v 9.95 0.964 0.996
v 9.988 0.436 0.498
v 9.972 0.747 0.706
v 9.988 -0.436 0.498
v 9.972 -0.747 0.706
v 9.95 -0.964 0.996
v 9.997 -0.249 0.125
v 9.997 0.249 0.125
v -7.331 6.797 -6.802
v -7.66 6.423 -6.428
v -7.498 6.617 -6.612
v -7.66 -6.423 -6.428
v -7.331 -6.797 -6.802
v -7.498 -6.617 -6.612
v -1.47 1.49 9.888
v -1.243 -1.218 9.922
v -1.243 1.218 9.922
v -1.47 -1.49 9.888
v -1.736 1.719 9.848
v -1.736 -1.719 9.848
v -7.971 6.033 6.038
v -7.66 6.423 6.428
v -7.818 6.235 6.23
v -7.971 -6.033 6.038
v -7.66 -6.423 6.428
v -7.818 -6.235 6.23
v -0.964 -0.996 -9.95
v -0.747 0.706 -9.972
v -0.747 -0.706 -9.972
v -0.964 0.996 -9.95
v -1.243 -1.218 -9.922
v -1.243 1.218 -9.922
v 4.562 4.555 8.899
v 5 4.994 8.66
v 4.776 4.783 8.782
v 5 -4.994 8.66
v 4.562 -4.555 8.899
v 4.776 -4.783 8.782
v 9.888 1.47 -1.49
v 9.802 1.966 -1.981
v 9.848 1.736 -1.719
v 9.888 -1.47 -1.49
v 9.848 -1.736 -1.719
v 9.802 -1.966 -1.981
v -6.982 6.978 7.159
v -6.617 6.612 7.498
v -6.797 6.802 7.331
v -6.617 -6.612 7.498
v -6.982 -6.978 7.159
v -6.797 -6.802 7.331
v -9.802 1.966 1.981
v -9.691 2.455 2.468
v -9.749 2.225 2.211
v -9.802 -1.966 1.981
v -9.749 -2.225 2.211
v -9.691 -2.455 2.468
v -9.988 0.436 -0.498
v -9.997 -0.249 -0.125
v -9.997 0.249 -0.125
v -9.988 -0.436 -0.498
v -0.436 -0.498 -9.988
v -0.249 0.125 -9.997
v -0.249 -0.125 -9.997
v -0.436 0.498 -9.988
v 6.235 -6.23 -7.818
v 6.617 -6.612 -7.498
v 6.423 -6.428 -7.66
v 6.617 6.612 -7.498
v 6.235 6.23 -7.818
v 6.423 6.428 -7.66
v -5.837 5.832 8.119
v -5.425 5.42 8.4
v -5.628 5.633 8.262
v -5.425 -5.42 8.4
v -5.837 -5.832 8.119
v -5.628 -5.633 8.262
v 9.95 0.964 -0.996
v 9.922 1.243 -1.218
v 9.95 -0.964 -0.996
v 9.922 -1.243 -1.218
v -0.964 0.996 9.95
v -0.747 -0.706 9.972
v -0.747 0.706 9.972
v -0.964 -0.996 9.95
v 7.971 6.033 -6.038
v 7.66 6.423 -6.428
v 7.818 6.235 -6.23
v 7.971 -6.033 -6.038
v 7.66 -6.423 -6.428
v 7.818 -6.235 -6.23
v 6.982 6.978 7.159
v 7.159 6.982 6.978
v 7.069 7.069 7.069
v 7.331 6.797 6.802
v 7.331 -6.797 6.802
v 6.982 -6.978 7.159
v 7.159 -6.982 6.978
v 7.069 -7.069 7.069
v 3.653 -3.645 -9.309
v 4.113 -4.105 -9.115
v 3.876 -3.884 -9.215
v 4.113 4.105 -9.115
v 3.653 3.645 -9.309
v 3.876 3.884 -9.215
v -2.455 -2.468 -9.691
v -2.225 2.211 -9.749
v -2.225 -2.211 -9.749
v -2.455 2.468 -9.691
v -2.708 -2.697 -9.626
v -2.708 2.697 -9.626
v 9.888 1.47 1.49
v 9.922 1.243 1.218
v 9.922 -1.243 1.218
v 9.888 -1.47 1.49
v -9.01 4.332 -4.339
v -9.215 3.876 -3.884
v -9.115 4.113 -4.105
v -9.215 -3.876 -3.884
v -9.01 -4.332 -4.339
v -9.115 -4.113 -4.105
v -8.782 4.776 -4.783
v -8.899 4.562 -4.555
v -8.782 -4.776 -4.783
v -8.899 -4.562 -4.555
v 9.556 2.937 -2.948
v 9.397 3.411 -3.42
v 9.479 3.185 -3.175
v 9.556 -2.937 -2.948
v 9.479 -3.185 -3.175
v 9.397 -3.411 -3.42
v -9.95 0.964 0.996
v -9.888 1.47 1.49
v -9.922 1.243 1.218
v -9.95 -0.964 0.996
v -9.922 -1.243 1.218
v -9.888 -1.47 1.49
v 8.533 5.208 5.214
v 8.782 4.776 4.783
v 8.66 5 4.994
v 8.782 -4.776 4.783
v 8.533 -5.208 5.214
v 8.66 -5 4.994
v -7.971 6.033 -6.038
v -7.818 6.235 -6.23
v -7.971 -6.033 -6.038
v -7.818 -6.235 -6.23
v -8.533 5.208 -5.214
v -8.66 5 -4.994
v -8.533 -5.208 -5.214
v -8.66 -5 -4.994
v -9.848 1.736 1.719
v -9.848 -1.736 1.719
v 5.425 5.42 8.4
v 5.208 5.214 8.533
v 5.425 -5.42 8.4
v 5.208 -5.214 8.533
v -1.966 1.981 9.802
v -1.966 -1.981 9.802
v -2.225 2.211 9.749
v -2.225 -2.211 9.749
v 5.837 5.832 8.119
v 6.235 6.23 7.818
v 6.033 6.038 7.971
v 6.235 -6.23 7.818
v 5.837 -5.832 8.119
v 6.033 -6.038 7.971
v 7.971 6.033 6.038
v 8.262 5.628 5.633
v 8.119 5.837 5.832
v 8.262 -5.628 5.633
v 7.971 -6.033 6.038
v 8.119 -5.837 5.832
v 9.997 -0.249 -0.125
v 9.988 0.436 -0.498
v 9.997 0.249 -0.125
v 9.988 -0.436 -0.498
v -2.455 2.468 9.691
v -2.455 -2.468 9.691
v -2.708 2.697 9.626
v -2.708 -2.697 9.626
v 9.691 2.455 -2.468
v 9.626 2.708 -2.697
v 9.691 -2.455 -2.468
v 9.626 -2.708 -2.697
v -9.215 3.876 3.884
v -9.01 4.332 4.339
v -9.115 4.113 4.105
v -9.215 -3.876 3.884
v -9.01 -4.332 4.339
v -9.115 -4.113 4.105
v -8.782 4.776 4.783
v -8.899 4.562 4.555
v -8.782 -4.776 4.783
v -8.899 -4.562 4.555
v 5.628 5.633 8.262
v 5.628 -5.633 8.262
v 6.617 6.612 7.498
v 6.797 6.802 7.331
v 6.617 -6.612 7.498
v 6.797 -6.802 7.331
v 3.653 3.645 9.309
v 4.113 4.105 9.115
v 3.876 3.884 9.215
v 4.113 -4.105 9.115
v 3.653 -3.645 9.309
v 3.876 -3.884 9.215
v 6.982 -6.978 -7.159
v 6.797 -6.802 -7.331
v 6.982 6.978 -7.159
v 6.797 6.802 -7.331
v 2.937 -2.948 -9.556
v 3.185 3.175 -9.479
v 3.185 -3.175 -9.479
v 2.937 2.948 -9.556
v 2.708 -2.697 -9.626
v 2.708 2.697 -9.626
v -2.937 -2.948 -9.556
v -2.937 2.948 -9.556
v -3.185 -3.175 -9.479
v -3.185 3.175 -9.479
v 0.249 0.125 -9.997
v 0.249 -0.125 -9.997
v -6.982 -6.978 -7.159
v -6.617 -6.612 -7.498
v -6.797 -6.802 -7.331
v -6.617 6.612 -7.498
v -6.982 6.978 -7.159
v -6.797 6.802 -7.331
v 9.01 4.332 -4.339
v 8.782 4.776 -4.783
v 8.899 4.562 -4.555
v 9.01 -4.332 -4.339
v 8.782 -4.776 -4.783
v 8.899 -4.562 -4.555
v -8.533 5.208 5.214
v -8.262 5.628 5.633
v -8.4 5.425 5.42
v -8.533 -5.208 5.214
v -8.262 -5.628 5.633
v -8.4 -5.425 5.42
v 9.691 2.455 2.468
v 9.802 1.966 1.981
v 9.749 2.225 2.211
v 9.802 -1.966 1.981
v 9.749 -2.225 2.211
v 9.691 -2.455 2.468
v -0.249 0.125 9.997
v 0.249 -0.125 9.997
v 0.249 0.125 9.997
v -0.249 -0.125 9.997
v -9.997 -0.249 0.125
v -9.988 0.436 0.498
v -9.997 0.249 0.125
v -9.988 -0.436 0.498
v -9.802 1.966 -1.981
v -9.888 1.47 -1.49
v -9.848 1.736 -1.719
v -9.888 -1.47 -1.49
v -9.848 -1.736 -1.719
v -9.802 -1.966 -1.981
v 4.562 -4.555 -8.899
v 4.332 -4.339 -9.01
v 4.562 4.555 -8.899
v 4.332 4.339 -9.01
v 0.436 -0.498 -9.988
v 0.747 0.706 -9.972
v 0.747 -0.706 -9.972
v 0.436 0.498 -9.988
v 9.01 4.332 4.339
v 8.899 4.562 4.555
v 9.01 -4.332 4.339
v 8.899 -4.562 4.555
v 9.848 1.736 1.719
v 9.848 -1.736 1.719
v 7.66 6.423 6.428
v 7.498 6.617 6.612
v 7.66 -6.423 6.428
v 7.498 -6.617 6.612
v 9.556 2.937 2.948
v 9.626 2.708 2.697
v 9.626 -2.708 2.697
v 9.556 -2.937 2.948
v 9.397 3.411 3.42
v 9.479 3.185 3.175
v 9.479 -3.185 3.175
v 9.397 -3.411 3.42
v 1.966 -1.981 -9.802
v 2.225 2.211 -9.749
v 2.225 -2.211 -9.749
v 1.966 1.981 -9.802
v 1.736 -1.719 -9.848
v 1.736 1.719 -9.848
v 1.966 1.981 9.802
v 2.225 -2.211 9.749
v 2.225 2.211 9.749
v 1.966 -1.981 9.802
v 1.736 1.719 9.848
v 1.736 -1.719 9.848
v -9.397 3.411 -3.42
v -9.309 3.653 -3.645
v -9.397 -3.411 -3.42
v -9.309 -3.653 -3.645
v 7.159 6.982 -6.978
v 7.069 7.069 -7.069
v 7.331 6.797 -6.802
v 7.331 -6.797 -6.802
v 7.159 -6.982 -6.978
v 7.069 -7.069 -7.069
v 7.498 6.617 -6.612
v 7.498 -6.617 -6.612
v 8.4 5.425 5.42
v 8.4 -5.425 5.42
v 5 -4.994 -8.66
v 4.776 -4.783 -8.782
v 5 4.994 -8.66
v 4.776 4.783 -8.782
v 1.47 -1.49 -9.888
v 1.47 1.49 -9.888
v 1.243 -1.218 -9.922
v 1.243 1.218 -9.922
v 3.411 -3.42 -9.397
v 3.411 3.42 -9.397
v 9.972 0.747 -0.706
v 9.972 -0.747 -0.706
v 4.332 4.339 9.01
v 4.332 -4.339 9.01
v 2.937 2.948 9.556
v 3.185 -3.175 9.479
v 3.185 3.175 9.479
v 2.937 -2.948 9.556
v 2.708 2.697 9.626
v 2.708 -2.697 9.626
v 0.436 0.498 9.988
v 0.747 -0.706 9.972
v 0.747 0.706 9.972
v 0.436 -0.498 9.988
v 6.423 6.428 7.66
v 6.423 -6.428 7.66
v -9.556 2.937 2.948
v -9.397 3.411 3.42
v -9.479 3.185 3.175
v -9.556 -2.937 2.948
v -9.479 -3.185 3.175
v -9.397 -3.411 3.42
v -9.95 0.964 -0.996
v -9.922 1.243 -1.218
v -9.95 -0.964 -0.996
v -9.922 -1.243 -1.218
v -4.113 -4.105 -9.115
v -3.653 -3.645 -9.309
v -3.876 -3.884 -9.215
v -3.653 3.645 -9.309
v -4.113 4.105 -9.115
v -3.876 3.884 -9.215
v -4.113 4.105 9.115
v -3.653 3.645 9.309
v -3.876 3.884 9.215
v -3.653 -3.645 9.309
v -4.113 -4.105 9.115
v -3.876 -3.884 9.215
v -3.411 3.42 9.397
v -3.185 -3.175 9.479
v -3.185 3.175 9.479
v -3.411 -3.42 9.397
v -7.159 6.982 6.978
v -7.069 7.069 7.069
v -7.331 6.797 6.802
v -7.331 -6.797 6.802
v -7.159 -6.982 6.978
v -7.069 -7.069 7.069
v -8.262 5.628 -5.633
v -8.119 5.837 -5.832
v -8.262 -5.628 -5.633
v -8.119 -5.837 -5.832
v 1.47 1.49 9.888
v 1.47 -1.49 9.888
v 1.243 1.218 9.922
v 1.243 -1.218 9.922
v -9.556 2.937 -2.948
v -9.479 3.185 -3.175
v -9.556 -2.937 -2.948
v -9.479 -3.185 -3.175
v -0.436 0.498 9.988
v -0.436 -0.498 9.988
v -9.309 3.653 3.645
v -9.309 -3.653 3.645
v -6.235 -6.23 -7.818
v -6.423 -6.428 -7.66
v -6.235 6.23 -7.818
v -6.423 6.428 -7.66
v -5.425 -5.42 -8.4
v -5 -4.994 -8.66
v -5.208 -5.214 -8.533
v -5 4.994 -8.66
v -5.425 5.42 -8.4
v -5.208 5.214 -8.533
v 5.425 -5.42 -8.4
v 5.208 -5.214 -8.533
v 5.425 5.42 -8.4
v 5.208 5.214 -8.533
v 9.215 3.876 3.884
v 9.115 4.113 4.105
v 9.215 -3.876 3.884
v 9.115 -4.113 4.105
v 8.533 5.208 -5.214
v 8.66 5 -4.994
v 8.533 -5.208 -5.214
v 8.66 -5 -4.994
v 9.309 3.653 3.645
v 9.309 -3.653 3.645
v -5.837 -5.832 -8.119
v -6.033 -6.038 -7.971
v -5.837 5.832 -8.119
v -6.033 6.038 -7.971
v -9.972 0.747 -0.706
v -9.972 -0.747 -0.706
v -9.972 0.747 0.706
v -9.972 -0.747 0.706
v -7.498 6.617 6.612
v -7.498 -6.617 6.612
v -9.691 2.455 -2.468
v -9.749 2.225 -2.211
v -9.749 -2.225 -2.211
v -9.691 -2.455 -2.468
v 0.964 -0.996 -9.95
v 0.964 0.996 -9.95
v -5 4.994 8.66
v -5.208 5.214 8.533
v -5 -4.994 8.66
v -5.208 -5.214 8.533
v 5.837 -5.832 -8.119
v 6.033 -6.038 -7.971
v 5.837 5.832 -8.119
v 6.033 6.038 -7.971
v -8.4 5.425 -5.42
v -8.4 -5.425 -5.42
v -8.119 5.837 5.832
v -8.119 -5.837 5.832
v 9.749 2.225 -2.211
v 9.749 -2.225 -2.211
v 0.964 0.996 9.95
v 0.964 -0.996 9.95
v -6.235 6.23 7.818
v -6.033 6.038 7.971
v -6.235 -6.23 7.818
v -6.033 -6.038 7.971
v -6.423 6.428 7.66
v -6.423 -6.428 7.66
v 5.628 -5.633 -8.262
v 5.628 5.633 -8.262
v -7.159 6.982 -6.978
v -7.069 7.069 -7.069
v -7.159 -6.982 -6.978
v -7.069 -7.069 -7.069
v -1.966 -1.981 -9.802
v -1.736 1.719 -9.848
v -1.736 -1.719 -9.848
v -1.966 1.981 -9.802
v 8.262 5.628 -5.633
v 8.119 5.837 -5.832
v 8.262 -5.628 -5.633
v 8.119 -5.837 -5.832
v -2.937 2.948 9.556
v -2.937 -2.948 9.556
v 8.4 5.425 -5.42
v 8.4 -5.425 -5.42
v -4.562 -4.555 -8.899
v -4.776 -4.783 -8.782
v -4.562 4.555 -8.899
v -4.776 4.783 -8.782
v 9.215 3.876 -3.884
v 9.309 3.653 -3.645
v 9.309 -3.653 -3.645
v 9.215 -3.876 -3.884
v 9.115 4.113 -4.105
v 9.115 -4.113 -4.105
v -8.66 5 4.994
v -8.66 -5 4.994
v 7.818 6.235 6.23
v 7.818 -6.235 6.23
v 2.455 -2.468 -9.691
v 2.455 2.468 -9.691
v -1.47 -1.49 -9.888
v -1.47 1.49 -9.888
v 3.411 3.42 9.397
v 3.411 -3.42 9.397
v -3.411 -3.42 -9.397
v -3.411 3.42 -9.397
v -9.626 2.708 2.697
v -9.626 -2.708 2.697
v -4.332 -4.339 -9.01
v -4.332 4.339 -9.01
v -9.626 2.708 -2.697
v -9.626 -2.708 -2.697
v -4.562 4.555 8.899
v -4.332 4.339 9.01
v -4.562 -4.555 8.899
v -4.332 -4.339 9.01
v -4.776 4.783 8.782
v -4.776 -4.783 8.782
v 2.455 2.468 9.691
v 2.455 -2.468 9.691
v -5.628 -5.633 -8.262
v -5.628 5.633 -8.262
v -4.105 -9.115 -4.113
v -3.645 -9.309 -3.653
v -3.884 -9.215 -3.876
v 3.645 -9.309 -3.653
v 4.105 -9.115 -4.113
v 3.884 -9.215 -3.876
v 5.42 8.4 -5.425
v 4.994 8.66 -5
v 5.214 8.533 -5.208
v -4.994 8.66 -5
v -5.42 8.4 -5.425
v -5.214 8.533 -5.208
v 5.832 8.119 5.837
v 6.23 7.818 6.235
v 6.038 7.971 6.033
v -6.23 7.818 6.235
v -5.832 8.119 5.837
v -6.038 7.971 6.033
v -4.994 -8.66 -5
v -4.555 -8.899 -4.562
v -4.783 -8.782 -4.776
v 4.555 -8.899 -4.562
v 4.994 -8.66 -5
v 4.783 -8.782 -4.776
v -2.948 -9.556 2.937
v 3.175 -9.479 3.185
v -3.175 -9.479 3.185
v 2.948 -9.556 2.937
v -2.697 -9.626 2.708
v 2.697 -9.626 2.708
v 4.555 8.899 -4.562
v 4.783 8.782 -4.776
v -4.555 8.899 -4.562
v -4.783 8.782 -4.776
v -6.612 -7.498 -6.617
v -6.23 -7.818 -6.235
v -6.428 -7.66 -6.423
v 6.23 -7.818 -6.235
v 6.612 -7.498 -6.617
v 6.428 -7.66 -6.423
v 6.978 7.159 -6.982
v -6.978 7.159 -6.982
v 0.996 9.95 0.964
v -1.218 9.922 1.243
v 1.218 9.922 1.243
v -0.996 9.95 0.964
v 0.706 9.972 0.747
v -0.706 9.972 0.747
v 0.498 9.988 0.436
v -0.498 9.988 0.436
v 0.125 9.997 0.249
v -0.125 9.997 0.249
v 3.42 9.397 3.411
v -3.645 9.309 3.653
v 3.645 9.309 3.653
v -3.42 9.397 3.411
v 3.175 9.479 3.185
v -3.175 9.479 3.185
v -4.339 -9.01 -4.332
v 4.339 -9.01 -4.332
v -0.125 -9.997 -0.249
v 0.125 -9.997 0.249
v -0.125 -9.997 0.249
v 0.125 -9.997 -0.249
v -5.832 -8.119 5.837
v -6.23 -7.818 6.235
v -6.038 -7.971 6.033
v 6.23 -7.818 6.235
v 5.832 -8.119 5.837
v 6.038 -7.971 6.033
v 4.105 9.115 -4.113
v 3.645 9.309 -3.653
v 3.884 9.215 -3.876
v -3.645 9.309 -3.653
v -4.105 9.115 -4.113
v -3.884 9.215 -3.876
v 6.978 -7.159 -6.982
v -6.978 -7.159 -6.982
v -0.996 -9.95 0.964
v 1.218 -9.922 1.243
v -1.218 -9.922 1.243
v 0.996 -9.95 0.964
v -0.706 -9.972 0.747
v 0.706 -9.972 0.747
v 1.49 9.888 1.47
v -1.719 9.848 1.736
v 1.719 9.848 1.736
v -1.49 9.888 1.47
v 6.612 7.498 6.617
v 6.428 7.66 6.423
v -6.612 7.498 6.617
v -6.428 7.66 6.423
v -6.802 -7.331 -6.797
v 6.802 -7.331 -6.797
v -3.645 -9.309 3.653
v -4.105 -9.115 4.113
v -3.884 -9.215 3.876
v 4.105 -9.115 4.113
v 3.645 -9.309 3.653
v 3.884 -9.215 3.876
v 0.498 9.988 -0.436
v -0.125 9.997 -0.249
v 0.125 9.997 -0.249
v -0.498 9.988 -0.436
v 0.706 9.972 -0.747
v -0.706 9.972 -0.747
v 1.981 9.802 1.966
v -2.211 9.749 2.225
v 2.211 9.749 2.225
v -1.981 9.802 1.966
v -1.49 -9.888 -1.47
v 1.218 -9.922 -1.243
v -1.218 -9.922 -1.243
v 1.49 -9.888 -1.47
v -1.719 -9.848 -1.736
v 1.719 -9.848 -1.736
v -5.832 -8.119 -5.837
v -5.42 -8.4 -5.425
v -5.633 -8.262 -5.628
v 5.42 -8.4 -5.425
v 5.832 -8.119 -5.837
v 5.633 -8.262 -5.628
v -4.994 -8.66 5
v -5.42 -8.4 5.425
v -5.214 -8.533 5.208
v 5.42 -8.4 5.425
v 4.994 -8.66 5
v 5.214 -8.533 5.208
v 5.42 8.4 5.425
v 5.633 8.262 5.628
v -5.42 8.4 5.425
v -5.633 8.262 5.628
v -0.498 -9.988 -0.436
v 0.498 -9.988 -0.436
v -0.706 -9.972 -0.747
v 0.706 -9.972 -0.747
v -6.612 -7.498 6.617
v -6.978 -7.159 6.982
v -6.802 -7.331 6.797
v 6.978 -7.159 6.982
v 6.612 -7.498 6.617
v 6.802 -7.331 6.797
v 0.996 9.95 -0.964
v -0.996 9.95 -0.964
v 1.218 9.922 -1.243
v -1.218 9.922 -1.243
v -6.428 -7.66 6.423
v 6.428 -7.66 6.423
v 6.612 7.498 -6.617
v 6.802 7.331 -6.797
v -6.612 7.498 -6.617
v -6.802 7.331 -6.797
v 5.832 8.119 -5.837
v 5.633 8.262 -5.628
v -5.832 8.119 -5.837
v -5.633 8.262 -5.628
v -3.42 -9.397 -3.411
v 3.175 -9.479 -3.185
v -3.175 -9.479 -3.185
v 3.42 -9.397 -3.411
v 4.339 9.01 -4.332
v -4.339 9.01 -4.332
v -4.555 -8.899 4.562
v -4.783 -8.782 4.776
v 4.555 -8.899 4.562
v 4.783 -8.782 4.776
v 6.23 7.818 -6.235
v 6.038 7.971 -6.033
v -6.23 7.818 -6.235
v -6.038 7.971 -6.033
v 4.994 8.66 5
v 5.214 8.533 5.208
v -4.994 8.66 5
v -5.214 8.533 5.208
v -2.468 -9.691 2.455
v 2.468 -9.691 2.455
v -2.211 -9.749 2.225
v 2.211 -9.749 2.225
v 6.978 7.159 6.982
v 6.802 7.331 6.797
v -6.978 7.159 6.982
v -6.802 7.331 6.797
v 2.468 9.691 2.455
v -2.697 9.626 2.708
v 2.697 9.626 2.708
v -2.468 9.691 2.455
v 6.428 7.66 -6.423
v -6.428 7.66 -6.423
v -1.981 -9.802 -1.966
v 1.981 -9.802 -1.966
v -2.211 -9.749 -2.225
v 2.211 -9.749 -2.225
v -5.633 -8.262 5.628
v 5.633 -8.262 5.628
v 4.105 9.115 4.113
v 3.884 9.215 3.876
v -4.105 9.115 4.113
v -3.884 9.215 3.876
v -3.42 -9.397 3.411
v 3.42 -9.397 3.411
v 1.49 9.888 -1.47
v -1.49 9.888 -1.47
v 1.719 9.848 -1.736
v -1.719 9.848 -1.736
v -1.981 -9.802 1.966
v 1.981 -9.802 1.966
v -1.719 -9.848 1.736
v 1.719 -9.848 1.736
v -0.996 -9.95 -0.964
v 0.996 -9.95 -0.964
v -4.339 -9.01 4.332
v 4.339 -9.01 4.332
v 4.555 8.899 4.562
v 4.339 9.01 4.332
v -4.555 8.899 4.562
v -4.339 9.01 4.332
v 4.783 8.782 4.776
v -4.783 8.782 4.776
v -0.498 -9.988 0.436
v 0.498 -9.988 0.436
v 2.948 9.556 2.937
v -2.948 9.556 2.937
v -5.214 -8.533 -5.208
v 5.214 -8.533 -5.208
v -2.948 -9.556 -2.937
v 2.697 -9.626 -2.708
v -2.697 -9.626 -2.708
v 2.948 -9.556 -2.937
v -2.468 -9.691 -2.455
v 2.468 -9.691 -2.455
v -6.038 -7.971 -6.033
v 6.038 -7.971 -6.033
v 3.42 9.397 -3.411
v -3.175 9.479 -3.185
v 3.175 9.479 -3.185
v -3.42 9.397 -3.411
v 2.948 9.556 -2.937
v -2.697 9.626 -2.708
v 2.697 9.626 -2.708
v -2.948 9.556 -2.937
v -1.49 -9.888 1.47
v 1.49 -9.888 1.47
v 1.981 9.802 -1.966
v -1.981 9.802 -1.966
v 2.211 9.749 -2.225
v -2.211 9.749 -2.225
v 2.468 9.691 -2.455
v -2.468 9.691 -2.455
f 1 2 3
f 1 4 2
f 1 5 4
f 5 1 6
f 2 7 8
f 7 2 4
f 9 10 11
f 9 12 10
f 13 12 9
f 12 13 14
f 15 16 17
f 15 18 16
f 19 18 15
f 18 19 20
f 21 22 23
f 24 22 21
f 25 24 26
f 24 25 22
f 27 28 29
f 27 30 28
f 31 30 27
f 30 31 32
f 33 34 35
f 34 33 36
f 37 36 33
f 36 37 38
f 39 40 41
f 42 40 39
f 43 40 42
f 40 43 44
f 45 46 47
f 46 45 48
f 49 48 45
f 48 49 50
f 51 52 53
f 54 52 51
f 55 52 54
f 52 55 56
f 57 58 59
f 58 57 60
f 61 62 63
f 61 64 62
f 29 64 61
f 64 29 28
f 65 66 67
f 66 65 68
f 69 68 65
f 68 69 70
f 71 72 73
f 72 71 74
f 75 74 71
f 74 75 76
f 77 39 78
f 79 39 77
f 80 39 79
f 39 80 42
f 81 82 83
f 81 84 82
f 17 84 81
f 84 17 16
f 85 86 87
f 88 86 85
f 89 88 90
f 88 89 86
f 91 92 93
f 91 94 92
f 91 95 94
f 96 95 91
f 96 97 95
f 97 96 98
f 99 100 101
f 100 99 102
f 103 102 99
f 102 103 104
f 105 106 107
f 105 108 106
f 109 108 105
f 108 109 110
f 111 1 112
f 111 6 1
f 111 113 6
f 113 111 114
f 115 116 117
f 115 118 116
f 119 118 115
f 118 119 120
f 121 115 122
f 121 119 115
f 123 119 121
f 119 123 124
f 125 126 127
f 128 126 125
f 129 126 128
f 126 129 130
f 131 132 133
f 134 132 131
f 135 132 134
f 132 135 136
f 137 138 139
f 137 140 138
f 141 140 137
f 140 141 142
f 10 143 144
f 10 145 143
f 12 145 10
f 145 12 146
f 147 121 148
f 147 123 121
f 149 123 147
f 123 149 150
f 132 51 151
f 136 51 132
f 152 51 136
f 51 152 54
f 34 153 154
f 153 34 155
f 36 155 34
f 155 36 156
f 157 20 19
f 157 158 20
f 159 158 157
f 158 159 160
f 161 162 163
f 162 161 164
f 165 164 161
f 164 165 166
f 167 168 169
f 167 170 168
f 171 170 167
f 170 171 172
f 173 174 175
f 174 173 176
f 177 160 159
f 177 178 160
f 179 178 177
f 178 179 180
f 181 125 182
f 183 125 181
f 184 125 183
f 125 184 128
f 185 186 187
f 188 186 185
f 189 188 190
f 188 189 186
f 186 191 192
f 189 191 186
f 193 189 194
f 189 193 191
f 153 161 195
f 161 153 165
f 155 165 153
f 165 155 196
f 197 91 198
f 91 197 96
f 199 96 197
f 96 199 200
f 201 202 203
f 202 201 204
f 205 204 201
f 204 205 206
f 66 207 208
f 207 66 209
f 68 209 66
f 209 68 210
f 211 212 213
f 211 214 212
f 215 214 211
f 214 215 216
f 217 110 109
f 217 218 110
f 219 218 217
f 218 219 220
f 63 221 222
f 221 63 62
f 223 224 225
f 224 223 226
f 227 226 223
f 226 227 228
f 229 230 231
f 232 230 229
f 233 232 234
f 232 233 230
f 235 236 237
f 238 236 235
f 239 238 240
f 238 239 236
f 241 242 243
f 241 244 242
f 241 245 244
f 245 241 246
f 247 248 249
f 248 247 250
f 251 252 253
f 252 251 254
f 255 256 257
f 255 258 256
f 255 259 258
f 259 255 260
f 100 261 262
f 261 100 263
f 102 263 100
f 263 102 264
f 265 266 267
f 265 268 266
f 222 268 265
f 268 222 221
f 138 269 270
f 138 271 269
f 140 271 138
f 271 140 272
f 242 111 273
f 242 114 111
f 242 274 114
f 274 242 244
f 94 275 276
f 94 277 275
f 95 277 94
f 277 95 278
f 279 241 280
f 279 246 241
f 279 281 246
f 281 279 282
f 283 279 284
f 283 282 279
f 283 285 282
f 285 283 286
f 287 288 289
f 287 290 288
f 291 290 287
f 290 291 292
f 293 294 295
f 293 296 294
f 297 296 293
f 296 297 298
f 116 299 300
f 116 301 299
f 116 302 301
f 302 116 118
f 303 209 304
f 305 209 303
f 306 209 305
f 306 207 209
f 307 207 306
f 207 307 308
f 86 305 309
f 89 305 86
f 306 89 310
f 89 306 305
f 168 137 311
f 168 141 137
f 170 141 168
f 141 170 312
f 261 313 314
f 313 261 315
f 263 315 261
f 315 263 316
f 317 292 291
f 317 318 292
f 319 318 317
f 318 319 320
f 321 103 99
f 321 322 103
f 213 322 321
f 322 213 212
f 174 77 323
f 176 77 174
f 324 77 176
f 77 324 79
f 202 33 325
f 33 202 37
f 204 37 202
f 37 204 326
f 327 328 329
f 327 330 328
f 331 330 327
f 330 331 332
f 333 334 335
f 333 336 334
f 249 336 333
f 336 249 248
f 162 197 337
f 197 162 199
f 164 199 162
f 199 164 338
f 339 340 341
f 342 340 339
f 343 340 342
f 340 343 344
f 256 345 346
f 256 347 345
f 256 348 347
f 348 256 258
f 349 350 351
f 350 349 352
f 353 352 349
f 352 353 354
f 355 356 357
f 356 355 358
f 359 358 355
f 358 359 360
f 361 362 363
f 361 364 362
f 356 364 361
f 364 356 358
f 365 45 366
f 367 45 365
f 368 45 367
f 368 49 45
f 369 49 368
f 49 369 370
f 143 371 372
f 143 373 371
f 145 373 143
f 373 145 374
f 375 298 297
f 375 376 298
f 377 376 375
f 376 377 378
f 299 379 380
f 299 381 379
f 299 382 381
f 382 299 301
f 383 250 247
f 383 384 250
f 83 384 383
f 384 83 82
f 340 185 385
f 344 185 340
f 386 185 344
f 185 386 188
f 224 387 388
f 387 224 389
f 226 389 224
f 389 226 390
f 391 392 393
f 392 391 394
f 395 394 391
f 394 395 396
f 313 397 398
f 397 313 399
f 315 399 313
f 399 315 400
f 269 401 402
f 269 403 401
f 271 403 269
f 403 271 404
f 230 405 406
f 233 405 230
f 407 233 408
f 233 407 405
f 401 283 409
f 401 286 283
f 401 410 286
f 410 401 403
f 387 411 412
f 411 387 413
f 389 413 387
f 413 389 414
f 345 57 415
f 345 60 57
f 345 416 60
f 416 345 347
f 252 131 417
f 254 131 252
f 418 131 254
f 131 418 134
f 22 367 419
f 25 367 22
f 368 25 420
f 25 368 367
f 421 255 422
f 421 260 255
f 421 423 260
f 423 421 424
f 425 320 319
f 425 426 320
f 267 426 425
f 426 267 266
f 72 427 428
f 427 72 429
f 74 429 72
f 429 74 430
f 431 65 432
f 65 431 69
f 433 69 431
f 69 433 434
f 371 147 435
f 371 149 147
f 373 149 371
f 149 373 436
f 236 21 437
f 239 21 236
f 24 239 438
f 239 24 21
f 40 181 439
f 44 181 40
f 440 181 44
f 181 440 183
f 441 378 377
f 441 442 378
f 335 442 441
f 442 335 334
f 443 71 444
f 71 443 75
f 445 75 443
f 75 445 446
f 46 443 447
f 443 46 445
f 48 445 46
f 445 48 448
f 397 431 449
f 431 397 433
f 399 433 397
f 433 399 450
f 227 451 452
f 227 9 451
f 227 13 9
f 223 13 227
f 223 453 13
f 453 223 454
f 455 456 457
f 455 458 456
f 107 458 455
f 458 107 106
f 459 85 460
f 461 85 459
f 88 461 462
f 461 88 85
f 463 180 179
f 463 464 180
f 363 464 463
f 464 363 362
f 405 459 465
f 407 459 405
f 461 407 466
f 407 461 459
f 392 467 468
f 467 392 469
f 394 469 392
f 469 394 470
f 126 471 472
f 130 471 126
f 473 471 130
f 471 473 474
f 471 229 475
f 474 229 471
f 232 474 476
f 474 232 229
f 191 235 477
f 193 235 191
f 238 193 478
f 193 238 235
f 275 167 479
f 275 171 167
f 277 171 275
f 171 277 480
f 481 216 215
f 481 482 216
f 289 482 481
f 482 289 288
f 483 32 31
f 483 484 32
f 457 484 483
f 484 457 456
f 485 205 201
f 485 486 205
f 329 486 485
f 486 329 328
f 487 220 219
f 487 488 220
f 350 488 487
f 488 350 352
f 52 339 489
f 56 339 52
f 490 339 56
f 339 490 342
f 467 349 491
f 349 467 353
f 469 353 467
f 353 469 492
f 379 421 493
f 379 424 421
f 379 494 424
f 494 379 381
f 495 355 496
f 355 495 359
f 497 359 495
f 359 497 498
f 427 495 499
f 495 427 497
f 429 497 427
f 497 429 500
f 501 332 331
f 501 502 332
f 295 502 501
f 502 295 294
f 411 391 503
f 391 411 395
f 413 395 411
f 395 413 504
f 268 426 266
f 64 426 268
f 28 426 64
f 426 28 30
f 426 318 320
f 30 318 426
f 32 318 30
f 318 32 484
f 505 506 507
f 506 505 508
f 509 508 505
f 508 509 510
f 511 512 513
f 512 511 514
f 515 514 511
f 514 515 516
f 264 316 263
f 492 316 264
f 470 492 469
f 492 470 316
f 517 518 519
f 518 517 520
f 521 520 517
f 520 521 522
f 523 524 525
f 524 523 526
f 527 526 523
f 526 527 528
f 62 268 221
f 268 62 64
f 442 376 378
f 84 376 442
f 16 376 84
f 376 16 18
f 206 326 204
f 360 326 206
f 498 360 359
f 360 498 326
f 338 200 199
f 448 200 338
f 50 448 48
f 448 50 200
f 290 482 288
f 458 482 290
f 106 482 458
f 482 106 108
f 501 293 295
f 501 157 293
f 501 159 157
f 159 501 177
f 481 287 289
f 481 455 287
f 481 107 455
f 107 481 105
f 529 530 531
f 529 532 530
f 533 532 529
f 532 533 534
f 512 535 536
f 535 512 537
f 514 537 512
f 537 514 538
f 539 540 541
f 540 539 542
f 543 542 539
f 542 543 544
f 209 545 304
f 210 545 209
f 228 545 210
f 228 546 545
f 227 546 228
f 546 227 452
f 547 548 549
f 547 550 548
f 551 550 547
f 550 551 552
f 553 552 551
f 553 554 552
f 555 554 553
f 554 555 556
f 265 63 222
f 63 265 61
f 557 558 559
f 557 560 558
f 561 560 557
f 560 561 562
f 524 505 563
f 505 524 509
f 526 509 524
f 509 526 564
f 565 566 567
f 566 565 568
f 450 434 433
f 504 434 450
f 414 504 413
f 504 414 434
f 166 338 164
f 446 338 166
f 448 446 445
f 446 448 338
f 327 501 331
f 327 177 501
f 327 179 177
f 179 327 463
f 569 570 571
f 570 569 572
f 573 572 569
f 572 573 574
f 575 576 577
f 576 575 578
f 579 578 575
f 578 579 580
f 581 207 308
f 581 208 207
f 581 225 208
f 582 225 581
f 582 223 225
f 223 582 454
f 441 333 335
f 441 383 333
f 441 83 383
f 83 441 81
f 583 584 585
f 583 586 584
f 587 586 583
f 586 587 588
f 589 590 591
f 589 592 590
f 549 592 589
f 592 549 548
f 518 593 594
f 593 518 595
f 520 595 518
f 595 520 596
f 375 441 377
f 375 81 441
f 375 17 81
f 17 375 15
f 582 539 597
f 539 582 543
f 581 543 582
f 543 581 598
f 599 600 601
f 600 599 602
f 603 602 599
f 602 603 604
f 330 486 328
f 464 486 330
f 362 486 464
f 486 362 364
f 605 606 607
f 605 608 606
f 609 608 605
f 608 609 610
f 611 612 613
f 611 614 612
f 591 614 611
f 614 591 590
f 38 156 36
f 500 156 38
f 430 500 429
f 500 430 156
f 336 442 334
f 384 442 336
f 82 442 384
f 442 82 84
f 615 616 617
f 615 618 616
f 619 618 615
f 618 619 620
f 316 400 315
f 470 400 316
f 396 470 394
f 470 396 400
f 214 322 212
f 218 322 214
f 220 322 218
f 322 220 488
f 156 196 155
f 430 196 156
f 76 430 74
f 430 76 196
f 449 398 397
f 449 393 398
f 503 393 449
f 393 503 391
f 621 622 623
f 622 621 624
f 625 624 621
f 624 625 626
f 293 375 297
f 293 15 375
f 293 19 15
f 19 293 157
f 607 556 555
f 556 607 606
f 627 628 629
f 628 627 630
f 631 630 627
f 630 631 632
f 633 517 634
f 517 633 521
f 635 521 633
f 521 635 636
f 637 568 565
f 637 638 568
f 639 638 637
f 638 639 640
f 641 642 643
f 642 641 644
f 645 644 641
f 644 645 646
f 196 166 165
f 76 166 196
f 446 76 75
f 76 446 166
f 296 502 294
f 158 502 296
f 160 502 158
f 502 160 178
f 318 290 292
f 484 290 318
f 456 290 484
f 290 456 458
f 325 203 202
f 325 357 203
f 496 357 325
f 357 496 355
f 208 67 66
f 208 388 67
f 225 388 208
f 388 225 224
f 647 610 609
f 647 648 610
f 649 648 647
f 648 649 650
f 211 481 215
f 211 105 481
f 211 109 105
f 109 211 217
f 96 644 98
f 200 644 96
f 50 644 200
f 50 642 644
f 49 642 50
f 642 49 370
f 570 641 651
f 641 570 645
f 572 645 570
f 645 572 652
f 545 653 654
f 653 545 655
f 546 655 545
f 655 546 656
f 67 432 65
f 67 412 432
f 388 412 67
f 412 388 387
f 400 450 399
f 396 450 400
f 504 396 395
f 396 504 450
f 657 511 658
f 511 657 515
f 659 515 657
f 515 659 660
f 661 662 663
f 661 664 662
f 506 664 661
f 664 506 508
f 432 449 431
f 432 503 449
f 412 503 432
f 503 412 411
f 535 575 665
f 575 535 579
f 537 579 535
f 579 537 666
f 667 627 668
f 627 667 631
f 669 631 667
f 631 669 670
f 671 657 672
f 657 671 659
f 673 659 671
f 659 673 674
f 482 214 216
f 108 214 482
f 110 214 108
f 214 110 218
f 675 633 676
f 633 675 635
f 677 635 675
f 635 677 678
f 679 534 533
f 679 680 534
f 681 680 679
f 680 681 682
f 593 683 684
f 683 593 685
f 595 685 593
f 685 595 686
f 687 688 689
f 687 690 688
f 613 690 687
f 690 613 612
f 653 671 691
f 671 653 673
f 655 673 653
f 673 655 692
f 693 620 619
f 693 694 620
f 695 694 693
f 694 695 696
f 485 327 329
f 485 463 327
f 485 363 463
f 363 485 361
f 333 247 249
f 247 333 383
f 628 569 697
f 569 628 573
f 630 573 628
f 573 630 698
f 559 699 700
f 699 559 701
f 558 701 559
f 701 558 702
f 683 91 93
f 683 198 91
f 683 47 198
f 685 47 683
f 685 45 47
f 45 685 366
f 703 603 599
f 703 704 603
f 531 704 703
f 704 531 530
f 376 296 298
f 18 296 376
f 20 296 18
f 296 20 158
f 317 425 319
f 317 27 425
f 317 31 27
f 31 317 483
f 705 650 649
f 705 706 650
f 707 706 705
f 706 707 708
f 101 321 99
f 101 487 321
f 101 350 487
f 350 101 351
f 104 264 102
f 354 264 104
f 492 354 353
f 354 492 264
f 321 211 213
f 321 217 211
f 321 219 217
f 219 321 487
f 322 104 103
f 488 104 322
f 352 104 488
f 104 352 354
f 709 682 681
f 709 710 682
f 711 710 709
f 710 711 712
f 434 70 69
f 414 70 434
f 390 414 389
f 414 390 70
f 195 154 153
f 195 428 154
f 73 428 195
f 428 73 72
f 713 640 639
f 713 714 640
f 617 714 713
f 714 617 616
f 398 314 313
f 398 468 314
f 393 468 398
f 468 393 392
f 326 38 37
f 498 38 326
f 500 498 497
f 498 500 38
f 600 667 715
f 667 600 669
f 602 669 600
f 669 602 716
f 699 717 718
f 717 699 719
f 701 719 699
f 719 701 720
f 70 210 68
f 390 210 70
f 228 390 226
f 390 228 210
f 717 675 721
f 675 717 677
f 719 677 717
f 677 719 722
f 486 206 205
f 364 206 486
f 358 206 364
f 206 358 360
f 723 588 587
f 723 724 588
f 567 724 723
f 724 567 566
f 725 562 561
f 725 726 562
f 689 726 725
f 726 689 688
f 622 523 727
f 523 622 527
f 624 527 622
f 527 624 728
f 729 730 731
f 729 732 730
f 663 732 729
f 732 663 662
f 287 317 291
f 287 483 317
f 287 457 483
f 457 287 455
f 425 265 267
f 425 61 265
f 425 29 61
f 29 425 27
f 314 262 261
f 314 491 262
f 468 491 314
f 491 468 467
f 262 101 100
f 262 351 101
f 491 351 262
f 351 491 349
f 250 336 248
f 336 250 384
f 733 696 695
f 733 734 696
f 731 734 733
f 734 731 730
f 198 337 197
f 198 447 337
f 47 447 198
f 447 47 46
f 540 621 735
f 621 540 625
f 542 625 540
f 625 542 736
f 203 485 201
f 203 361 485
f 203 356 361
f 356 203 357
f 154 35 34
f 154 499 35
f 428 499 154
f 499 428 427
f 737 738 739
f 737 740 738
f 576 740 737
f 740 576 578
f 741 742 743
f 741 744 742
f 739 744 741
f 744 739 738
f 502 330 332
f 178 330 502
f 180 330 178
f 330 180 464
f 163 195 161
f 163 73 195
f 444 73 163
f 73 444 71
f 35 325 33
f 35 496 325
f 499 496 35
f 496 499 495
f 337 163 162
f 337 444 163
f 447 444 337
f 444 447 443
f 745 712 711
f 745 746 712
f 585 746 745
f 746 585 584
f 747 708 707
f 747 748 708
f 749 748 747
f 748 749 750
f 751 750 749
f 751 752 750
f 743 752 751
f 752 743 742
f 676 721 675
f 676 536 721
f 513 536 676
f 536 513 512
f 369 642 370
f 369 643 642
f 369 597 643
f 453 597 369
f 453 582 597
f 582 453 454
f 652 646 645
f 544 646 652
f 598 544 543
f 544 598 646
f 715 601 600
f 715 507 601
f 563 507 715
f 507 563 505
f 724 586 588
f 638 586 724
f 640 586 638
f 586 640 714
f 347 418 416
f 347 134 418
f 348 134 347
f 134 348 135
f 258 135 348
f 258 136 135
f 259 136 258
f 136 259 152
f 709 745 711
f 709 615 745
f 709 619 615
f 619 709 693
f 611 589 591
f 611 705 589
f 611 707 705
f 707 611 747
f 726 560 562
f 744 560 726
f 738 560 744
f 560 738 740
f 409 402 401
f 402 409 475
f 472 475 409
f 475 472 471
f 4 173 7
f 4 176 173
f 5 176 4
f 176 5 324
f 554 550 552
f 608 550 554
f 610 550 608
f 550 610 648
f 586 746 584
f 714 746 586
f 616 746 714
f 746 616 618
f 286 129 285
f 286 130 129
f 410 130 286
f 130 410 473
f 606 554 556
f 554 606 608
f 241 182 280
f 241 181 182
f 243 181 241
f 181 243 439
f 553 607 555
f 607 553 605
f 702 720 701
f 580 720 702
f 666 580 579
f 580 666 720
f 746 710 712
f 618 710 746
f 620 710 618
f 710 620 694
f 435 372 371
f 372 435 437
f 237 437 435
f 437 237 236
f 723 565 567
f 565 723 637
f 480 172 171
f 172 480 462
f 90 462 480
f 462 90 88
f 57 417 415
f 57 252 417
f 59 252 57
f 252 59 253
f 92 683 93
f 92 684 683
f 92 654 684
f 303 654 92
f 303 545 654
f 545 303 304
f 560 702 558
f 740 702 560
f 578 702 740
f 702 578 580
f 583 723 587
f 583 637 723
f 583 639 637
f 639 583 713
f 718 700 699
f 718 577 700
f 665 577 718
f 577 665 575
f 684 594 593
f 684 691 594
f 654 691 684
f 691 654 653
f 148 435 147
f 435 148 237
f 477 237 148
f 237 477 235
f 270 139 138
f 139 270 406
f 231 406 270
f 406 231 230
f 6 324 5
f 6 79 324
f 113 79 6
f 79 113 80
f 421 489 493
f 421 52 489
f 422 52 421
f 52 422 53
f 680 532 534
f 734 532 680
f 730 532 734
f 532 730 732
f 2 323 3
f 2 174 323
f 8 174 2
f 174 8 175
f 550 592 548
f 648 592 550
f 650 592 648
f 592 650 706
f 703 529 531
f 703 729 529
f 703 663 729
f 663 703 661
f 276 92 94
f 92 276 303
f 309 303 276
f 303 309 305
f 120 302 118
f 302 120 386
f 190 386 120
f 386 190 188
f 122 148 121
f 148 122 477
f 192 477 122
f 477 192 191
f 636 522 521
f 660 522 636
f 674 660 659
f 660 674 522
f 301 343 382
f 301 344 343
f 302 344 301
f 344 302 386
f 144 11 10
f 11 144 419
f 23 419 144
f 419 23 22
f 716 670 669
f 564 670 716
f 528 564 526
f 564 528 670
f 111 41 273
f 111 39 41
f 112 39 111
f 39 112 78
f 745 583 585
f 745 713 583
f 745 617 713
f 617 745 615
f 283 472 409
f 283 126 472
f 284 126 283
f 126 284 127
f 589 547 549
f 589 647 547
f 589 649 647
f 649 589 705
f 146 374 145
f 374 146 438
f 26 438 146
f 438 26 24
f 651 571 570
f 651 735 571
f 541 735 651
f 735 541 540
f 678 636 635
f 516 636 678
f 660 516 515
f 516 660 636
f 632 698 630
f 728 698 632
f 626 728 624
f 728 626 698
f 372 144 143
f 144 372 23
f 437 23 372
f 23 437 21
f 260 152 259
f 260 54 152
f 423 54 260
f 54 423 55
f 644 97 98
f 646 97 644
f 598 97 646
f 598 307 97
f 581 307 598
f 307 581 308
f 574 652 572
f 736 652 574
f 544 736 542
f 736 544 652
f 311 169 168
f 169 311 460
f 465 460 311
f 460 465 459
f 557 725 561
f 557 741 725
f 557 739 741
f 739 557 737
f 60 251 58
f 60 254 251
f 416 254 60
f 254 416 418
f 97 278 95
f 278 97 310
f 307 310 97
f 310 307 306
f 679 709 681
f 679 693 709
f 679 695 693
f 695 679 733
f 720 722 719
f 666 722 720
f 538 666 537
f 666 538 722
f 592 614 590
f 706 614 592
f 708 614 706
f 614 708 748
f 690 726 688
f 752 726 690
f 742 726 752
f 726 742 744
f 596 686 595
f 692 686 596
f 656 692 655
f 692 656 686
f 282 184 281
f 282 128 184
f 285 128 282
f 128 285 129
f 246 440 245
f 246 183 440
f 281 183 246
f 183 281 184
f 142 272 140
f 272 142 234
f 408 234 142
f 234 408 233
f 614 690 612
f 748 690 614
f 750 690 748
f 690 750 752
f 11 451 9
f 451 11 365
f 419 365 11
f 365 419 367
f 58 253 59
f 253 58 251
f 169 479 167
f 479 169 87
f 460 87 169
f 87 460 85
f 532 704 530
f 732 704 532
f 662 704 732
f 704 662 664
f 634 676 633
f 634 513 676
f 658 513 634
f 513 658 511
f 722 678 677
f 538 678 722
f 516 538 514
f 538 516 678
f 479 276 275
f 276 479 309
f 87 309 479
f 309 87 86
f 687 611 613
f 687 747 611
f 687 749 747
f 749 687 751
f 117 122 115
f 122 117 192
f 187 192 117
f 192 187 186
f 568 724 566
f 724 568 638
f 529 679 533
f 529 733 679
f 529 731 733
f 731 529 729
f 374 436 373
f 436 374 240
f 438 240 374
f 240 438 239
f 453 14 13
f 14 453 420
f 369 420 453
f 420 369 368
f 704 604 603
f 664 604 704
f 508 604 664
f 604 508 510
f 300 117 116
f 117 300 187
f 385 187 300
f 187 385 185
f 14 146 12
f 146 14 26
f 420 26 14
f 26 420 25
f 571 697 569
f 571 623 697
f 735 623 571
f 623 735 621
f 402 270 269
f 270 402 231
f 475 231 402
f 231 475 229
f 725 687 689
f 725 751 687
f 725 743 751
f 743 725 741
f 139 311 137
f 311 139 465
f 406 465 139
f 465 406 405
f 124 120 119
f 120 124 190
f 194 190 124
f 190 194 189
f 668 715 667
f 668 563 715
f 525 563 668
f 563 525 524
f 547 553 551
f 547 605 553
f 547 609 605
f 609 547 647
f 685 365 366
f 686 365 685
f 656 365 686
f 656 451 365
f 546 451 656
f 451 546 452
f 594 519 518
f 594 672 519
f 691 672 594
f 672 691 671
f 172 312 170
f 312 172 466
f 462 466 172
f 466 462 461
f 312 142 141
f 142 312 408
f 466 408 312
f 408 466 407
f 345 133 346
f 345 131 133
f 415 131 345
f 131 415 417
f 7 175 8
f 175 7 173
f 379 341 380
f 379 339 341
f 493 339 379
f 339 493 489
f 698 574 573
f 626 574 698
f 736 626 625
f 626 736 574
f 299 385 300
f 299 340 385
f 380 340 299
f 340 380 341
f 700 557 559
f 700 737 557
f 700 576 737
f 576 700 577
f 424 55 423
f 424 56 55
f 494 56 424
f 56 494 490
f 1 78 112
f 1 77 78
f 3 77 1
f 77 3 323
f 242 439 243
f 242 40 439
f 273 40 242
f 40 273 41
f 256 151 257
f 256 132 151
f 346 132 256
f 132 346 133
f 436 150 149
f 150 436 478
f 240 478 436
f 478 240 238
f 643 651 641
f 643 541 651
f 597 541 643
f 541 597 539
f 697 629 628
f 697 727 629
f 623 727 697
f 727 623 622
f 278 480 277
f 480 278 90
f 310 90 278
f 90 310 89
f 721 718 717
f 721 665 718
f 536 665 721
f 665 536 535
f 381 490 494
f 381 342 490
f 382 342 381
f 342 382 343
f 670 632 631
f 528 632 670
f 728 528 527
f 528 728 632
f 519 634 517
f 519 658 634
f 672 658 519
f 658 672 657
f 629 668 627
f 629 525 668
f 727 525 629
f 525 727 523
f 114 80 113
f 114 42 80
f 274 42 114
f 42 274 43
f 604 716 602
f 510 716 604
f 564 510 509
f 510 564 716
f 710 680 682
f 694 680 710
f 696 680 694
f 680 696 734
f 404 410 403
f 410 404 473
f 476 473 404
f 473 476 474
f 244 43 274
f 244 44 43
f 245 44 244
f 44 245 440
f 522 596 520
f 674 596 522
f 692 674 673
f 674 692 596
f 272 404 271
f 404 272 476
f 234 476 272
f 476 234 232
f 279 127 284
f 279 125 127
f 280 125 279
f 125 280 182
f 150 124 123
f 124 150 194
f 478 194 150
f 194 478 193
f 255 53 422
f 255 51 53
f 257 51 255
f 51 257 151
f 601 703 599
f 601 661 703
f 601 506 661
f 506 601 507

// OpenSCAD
intersection(){
rotate([90,0,0]){
cylinder(h=50,center=true,$fa=0.5,$fs=0.5,r=10);
}
rotate([0,90,0]){
cylinder(h=50,center=true,$fa=0.5,$fs=0.5,r=10);
}
rotate([0,0,90]){
cylinder(h=50,center=true,$fa=0.5,$fs=0.5,r=10);
}
}
